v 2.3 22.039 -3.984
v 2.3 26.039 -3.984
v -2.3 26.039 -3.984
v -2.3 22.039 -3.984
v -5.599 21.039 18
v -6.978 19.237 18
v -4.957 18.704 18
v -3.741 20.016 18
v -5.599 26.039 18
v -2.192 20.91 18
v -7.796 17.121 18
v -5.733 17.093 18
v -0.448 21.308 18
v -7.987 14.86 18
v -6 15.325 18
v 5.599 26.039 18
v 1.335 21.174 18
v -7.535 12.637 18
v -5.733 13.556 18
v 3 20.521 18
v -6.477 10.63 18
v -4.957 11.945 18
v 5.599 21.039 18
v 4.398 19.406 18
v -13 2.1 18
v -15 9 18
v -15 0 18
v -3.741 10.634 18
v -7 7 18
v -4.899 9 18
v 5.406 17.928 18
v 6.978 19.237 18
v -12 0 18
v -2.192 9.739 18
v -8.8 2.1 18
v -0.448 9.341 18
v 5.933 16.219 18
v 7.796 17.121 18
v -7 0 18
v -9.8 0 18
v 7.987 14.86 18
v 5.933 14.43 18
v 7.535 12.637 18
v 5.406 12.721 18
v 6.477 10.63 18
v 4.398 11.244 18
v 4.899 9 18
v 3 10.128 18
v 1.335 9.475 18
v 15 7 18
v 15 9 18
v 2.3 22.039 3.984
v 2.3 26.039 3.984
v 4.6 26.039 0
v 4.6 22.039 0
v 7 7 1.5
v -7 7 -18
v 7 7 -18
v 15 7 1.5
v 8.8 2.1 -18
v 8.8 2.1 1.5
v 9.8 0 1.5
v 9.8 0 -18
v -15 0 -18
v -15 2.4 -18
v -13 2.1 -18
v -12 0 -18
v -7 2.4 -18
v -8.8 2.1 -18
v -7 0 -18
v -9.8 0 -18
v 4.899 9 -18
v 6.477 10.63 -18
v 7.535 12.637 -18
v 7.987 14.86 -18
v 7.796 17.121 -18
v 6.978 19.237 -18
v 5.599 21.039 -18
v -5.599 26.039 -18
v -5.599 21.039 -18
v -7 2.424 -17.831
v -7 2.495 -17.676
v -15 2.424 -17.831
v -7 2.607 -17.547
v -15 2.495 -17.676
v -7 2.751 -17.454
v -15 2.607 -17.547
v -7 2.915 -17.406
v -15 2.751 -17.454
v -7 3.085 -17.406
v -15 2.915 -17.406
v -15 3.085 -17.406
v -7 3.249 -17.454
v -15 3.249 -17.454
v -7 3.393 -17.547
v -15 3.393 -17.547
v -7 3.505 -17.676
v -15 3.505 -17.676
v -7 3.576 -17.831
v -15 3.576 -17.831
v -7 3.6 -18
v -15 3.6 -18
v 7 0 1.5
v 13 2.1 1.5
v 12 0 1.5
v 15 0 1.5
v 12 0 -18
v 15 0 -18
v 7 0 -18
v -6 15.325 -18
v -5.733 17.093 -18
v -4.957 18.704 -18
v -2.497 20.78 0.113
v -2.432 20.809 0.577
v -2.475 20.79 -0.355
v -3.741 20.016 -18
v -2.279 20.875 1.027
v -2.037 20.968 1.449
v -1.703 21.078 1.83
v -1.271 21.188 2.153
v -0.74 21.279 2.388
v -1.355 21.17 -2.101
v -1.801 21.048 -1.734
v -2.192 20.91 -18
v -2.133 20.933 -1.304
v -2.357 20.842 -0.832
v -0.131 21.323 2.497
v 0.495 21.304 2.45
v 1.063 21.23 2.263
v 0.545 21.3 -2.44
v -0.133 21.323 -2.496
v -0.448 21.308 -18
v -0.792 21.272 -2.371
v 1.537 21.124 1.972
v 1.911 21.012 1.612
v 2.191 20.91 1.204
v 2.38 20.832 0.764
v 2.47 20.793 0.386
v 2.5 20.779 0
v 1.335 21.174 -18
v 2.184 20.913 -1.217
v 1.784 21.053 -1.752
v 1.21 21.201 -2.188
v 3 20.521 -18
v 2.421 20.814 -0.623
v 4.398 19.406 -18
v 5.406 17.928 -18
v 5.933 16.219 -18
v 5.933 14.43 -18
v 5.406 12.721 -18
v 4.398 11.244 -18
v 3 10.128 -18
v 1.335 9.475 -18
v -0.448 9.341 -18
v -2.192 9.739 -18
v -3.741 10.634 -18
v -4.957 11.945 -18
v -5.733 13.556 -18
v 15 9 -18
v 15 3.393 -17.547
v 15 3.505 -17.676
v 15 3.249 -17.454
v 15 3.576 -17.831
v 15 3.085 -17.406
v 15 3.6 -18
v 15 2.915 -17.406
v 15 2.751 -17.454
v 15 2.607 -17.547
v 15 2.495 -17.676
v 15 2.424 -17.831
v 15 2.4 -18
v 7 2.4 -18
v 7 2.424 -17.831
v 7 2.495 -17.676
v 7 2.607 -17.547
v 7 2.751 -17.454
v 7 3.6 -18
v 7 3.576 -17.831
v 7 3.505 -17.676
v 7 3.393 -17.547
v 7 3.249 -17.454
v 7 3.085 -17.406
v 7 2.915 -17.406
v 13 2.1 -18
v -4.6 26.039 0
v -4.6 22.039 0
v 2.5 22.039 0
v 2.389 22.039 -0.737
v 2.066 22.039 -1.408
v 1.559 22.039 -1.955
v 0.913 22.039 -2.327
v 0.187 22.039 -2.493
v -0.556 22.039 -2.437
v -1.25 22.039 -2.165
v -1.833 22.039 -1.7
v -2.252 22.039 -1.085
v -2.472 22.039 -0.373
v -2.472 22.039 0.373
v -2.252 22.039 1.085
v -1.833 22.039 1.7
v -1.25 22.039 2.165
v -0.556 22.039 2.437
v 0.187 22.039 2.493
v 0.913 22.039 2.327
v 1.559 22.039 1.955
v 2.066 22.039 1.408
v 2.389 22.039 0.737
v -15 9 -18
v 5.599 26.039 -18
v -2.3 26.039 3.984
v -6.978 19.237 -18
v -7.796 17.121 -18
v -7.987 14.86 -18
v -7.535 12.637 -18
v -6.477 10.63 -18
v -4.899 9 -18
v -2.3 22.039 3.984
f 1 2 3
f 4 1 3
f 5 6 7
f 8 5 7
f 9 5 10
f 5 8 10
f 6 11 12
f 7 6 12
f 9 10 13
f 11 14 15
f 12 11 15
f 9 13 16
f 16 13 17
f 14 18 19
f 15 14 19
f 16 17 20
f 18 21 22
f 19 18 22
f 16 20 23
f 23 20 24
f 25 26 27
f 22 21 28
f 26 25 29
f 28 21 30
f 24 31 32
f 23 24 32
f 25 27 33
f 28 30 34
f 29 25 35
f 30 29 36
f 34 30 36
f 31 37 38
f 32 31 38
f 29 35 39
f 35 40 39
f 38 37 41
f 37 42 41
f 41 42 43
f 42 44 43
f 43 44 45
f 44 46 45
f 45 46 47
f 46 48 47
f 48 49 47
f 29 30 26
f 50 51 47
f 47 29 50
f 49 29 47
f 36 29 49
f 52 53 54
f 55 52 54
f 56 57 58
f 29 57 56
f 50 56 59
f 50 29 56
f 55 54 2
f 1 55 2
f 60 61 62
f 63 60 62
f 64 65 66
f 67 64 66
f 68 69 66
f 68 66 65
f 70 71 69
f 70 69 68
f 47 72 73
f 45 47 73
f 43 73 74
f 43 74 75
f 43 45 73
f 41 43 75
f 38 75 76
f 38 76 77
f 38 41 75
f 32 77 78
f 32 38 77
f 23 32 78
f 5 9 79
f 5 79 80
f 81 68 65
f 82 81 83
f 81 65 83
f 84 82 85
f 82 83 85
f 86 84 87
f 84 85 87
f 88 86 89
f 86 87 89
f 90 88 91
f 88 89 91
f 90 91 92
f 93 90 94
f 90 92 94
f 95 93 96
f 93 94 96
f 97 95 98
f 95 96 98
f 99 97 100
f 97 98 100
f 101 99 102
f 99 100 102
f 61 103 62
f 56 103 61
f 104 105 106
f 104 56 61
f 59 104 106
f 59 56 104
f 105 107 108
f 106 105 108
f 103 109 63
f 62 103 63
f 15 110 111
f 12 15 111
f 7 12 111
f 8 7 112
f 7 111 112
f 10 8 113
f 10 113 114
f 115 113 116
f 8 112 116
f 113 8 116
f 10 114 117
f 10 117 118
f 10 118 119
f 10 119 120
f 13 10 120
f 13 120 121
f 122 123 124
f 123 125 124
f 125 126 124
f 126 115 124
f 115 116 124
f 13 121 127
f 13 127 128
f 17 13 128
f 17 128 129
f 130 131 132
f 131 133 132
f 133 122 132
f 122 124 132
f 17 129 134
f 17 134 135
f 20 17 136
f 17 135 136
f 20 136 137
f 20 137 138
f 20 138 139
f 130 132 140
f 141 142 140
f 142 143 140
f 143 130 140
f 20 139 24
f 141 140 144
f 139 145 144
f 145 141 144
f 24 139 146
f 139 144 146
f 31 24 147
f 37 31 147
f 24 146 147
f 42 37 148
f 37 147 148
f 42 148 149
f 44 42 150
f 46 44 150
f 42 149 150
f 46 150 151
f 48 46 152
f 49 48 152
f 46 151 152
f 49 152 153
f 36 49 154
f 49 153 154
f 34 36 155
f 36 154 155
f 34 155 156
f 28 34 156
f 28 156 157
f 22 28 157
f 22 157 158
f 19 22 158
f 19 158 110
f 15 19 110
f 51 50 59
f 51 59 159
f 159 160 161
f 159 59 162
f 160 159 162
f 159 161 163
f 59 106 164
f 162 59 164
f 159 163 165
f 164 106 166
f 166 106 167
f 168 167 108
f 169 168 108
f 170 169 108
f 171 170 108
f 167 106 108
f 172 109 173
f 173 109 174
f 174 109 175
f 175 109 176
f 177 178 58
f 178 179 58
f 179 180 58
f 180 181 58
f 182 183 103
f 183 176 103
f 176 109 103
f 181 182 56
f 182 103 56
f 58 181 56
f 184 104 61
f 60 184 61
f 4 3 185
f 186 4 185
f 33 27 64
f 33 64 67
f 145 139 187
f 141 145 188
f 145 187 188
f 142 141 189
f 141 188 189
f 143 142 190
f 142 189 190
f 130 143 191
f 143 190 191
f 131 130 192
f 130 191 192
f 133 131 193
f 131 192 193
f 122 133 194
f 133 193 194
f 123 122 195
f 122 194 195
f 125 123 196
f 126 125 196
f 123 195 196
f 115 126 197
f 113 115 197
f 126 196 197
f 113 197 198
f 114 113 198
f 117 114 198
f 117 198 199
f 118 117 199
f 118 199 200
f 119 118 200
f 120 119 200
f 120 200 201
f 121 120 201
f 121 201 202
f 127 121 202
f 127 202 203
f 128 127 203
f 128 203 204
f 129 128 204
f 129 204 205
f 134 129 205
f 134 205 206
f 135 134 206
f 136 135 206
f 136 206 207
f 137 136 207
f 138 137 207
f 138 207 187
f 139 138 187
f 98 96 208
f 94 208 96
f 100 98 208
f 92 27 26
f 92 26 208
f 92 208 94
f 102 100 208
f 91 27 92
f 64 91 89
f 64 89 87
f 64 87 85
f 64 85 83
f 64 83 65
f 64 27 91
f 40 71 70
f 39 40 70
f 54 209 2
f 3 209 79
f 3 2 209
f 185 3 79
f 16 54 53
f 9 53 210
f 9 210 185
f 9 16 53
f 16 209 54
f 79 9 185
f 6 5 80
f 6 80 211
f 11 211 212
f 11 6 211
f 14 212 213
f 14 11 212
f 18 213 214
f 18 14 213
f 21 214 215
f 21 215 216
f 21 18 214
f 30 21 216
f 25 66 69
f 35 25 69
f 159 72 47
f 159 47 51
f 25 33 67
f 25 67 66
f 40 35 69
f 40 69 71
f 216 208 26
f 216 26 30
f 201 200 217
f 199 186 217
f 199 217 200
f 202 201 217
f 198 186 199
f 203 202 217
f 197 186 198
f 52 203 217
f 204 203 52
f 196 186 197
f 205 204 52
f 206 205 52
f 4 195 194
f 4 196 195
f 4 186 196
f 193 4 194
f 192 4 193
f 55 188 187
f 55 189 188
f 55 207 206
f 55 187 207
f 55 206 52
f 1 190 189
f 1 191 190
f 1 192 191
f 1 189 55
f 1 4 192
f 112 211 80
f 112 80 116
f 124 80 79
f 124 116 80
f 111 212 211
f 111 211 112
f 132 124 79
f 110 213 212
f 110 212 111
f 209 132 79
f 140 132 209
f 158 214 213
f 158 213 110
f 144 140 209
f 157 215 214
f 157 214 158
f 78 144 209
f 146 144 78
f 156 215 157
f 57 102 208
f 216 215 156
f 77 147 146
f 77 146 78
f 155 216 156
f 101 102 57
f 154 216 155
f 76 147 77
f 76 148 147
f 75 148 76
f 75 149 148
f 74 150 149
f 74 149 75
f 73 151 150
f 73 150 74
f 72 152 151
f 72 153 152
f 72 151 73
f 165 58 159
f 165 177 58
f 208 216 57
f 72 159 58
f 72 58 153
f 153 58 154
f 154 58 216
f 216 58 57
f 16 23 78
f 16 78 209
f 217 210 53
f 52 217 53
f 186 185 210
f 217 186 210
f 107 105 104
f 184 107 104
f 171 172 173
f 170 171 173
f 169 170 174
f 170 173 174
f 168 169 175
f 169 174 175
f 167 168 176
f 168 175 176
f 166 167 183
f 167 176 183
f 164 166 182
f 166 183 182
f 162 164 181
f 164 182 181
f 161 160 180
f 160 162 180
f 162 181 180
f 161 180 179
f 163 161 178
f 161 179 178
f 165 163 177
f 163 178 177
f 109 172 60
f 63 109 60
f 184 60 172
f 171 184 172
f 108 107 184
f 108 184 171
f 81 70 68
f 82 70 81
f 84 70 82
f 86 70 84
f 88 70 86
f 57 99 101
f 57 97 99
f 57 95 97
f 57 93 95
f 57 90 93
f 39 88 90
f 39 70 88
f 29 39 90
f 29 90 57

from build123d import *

# Parameters (mm, degrees)
SKETCH1_W           = 30
SKETCH1_H           = 36
BOSS_EXTRUDE1_DEPTH = 9
CUT_EXTRUDE1_DEPTH  = 37
SKETCH3_W           = 22
SKETCH3_H           = 7
CUT_EXTRUDE2_DEPTH  = 16.5
SKETCH4_W           = 14
SKETCH4_H           = 7
CUT_EXTRUDE3_DEPTH  = 20.5
BOSS_EXTRUDE4_DEPTH = 36
SKETCH6_R           = 6
CUT_EXTRUDE4_DEPTH  = 37
CUT_EXTRUDE8_DEPTH  = 4
SKETCH8_R           = 2.5
CUT_EXTRUDE9_DEPTH  = 3
SKETCH9_R           = 0.6
CUT_EXTRUDE10_DEPTH = 31


with BuildPart() as part:
    # Sketch1 → Boss-Extrude1 (new body)
    with BuildSketch(Plane(origin=(0, 0, 0), x_dir=(1, 0, 0), z_dir=(0, 1, 0))):
        Rectangle(SKETCH1_W, SKETCH1_H)
    extrude(amount=BOSS_EXTRUDE1_DEPTH)

    # Sketch2 → Cut-Extrude1 (cut, through all)
    with BuildSketch(Plane.XY.offset(18)):
        Polygon((-12, 0), (-13, 2.1), (-8.8, 2.1), (-9.8, 0), align=None)
        Polygon((12, 0), (13, 2.1), (8.8, 2.1), (9.8, 0), align=None)
    extrude(amount=-CUT_EXTRUDE1_DEPTH, mode=Mode.SUBTRACT)

    # Sketch3 → Cut-Extrude2 (cut)
    with BuildSketch(Plane.XY.offset(18)):
        with Locations((4, 3.5)):
            Rectangle(SKETCH3_W, SKETCH3_H)
    extrude(amount=-CUT_EXTRUDE2_DEPTH, mode=Mode.SUBTRACT)

    # Sketch4 → Cut-Extrude3 (cut, through all)
    with BuildSketch(Plane.XY.offset(1.5)):
        with Locations((0, 3.5)):
            Rectangle(SKETCH4_W, SKETCH4_H)
    extrude(amount=-CUT_EXTRUDE3_DEPTH, mode=Mode.SUBTRACT)

    # Sketch5 → Boss-Extrude4 (add)
    with BuildSketch(Plane.XY.offset(18)):
        with BuildLine():
            Line((-4.898979486, 9), (4.898979486, 9))
            ThreePointArc((4.898979486, 9), (7.986516373, 14.860274987), (5.598833698, 21.038841035))
            Line((5.598833698, 21.038841035), (5.598833698, 26.038841035))
            Line((5.598833698, 26.038841035), (-5.598833698, 26.038841035))
            Line((-5.598833698, 26.038841035), (-5.598833698, 21.038841035))
            ThreePointArc((-5.598833698, 21.038841035), (-7.986516373, 14.860274987), (-4.898979486, 9))
        make_face()
    extrude(amount=-BOSS_EXTRUDE4_DEPTH)

    # Sketch6 → Cut-Extrude4 (cut, through all)
    with BuildSketch(Plane(origin=(0, 0, -18), x_dir=(-1, 0, 0), z_dir=(0, 0, -1))):
        with Locations((0, 15.32455532)):
            Circle(SKETCH6_R)
    extrude(amount=-CUT_EXTRUDE4_DEPTH, mode=Mode.SUBTRACT)

    # Sketch7 → Cut-Extrude8 (cut)
    with BuildSketch(Plane(origin=(0, 26.038841035, 0), x_dir=(1, 0, 0), z_dir=(0, 1, 0))):
        Polygon((2.3, -3.983716857), (4.6, 0), (2.3, 3.983716857), (-2.3, 3.983716857), (-4.6, 0), (-2.3, -3.983716857), align=None)
    extrude(amount=-CUT_EXTRUDE8_DEPTH, mode=Mode.SUBTRACT)

    # Sketch8 → Cut-Extrude9 (cut)
    with BuildSketch(Plane(origin=(0, 22.038841035, 0), x_dir=(1, 0, 0), z_dir=(0, 1, 0))):
        Circle(SKETCH8_R)
    extrude(amount=-CUT_EXTRUDE9_DEPTH, mode=Mode.SUBTRACT)

    # Sketch9 → Cut-Extrude10 (cut, through all)
    with BuildSketch(Plane.ZY.offset(15)):
        with Locations((-18, 3)):
            Circle(SKETCH9_R)
    extrude(amount=-CUT_EXTRUDE10_DEPTH, mode=Mode.SUBTRACT)


solid = part.part
